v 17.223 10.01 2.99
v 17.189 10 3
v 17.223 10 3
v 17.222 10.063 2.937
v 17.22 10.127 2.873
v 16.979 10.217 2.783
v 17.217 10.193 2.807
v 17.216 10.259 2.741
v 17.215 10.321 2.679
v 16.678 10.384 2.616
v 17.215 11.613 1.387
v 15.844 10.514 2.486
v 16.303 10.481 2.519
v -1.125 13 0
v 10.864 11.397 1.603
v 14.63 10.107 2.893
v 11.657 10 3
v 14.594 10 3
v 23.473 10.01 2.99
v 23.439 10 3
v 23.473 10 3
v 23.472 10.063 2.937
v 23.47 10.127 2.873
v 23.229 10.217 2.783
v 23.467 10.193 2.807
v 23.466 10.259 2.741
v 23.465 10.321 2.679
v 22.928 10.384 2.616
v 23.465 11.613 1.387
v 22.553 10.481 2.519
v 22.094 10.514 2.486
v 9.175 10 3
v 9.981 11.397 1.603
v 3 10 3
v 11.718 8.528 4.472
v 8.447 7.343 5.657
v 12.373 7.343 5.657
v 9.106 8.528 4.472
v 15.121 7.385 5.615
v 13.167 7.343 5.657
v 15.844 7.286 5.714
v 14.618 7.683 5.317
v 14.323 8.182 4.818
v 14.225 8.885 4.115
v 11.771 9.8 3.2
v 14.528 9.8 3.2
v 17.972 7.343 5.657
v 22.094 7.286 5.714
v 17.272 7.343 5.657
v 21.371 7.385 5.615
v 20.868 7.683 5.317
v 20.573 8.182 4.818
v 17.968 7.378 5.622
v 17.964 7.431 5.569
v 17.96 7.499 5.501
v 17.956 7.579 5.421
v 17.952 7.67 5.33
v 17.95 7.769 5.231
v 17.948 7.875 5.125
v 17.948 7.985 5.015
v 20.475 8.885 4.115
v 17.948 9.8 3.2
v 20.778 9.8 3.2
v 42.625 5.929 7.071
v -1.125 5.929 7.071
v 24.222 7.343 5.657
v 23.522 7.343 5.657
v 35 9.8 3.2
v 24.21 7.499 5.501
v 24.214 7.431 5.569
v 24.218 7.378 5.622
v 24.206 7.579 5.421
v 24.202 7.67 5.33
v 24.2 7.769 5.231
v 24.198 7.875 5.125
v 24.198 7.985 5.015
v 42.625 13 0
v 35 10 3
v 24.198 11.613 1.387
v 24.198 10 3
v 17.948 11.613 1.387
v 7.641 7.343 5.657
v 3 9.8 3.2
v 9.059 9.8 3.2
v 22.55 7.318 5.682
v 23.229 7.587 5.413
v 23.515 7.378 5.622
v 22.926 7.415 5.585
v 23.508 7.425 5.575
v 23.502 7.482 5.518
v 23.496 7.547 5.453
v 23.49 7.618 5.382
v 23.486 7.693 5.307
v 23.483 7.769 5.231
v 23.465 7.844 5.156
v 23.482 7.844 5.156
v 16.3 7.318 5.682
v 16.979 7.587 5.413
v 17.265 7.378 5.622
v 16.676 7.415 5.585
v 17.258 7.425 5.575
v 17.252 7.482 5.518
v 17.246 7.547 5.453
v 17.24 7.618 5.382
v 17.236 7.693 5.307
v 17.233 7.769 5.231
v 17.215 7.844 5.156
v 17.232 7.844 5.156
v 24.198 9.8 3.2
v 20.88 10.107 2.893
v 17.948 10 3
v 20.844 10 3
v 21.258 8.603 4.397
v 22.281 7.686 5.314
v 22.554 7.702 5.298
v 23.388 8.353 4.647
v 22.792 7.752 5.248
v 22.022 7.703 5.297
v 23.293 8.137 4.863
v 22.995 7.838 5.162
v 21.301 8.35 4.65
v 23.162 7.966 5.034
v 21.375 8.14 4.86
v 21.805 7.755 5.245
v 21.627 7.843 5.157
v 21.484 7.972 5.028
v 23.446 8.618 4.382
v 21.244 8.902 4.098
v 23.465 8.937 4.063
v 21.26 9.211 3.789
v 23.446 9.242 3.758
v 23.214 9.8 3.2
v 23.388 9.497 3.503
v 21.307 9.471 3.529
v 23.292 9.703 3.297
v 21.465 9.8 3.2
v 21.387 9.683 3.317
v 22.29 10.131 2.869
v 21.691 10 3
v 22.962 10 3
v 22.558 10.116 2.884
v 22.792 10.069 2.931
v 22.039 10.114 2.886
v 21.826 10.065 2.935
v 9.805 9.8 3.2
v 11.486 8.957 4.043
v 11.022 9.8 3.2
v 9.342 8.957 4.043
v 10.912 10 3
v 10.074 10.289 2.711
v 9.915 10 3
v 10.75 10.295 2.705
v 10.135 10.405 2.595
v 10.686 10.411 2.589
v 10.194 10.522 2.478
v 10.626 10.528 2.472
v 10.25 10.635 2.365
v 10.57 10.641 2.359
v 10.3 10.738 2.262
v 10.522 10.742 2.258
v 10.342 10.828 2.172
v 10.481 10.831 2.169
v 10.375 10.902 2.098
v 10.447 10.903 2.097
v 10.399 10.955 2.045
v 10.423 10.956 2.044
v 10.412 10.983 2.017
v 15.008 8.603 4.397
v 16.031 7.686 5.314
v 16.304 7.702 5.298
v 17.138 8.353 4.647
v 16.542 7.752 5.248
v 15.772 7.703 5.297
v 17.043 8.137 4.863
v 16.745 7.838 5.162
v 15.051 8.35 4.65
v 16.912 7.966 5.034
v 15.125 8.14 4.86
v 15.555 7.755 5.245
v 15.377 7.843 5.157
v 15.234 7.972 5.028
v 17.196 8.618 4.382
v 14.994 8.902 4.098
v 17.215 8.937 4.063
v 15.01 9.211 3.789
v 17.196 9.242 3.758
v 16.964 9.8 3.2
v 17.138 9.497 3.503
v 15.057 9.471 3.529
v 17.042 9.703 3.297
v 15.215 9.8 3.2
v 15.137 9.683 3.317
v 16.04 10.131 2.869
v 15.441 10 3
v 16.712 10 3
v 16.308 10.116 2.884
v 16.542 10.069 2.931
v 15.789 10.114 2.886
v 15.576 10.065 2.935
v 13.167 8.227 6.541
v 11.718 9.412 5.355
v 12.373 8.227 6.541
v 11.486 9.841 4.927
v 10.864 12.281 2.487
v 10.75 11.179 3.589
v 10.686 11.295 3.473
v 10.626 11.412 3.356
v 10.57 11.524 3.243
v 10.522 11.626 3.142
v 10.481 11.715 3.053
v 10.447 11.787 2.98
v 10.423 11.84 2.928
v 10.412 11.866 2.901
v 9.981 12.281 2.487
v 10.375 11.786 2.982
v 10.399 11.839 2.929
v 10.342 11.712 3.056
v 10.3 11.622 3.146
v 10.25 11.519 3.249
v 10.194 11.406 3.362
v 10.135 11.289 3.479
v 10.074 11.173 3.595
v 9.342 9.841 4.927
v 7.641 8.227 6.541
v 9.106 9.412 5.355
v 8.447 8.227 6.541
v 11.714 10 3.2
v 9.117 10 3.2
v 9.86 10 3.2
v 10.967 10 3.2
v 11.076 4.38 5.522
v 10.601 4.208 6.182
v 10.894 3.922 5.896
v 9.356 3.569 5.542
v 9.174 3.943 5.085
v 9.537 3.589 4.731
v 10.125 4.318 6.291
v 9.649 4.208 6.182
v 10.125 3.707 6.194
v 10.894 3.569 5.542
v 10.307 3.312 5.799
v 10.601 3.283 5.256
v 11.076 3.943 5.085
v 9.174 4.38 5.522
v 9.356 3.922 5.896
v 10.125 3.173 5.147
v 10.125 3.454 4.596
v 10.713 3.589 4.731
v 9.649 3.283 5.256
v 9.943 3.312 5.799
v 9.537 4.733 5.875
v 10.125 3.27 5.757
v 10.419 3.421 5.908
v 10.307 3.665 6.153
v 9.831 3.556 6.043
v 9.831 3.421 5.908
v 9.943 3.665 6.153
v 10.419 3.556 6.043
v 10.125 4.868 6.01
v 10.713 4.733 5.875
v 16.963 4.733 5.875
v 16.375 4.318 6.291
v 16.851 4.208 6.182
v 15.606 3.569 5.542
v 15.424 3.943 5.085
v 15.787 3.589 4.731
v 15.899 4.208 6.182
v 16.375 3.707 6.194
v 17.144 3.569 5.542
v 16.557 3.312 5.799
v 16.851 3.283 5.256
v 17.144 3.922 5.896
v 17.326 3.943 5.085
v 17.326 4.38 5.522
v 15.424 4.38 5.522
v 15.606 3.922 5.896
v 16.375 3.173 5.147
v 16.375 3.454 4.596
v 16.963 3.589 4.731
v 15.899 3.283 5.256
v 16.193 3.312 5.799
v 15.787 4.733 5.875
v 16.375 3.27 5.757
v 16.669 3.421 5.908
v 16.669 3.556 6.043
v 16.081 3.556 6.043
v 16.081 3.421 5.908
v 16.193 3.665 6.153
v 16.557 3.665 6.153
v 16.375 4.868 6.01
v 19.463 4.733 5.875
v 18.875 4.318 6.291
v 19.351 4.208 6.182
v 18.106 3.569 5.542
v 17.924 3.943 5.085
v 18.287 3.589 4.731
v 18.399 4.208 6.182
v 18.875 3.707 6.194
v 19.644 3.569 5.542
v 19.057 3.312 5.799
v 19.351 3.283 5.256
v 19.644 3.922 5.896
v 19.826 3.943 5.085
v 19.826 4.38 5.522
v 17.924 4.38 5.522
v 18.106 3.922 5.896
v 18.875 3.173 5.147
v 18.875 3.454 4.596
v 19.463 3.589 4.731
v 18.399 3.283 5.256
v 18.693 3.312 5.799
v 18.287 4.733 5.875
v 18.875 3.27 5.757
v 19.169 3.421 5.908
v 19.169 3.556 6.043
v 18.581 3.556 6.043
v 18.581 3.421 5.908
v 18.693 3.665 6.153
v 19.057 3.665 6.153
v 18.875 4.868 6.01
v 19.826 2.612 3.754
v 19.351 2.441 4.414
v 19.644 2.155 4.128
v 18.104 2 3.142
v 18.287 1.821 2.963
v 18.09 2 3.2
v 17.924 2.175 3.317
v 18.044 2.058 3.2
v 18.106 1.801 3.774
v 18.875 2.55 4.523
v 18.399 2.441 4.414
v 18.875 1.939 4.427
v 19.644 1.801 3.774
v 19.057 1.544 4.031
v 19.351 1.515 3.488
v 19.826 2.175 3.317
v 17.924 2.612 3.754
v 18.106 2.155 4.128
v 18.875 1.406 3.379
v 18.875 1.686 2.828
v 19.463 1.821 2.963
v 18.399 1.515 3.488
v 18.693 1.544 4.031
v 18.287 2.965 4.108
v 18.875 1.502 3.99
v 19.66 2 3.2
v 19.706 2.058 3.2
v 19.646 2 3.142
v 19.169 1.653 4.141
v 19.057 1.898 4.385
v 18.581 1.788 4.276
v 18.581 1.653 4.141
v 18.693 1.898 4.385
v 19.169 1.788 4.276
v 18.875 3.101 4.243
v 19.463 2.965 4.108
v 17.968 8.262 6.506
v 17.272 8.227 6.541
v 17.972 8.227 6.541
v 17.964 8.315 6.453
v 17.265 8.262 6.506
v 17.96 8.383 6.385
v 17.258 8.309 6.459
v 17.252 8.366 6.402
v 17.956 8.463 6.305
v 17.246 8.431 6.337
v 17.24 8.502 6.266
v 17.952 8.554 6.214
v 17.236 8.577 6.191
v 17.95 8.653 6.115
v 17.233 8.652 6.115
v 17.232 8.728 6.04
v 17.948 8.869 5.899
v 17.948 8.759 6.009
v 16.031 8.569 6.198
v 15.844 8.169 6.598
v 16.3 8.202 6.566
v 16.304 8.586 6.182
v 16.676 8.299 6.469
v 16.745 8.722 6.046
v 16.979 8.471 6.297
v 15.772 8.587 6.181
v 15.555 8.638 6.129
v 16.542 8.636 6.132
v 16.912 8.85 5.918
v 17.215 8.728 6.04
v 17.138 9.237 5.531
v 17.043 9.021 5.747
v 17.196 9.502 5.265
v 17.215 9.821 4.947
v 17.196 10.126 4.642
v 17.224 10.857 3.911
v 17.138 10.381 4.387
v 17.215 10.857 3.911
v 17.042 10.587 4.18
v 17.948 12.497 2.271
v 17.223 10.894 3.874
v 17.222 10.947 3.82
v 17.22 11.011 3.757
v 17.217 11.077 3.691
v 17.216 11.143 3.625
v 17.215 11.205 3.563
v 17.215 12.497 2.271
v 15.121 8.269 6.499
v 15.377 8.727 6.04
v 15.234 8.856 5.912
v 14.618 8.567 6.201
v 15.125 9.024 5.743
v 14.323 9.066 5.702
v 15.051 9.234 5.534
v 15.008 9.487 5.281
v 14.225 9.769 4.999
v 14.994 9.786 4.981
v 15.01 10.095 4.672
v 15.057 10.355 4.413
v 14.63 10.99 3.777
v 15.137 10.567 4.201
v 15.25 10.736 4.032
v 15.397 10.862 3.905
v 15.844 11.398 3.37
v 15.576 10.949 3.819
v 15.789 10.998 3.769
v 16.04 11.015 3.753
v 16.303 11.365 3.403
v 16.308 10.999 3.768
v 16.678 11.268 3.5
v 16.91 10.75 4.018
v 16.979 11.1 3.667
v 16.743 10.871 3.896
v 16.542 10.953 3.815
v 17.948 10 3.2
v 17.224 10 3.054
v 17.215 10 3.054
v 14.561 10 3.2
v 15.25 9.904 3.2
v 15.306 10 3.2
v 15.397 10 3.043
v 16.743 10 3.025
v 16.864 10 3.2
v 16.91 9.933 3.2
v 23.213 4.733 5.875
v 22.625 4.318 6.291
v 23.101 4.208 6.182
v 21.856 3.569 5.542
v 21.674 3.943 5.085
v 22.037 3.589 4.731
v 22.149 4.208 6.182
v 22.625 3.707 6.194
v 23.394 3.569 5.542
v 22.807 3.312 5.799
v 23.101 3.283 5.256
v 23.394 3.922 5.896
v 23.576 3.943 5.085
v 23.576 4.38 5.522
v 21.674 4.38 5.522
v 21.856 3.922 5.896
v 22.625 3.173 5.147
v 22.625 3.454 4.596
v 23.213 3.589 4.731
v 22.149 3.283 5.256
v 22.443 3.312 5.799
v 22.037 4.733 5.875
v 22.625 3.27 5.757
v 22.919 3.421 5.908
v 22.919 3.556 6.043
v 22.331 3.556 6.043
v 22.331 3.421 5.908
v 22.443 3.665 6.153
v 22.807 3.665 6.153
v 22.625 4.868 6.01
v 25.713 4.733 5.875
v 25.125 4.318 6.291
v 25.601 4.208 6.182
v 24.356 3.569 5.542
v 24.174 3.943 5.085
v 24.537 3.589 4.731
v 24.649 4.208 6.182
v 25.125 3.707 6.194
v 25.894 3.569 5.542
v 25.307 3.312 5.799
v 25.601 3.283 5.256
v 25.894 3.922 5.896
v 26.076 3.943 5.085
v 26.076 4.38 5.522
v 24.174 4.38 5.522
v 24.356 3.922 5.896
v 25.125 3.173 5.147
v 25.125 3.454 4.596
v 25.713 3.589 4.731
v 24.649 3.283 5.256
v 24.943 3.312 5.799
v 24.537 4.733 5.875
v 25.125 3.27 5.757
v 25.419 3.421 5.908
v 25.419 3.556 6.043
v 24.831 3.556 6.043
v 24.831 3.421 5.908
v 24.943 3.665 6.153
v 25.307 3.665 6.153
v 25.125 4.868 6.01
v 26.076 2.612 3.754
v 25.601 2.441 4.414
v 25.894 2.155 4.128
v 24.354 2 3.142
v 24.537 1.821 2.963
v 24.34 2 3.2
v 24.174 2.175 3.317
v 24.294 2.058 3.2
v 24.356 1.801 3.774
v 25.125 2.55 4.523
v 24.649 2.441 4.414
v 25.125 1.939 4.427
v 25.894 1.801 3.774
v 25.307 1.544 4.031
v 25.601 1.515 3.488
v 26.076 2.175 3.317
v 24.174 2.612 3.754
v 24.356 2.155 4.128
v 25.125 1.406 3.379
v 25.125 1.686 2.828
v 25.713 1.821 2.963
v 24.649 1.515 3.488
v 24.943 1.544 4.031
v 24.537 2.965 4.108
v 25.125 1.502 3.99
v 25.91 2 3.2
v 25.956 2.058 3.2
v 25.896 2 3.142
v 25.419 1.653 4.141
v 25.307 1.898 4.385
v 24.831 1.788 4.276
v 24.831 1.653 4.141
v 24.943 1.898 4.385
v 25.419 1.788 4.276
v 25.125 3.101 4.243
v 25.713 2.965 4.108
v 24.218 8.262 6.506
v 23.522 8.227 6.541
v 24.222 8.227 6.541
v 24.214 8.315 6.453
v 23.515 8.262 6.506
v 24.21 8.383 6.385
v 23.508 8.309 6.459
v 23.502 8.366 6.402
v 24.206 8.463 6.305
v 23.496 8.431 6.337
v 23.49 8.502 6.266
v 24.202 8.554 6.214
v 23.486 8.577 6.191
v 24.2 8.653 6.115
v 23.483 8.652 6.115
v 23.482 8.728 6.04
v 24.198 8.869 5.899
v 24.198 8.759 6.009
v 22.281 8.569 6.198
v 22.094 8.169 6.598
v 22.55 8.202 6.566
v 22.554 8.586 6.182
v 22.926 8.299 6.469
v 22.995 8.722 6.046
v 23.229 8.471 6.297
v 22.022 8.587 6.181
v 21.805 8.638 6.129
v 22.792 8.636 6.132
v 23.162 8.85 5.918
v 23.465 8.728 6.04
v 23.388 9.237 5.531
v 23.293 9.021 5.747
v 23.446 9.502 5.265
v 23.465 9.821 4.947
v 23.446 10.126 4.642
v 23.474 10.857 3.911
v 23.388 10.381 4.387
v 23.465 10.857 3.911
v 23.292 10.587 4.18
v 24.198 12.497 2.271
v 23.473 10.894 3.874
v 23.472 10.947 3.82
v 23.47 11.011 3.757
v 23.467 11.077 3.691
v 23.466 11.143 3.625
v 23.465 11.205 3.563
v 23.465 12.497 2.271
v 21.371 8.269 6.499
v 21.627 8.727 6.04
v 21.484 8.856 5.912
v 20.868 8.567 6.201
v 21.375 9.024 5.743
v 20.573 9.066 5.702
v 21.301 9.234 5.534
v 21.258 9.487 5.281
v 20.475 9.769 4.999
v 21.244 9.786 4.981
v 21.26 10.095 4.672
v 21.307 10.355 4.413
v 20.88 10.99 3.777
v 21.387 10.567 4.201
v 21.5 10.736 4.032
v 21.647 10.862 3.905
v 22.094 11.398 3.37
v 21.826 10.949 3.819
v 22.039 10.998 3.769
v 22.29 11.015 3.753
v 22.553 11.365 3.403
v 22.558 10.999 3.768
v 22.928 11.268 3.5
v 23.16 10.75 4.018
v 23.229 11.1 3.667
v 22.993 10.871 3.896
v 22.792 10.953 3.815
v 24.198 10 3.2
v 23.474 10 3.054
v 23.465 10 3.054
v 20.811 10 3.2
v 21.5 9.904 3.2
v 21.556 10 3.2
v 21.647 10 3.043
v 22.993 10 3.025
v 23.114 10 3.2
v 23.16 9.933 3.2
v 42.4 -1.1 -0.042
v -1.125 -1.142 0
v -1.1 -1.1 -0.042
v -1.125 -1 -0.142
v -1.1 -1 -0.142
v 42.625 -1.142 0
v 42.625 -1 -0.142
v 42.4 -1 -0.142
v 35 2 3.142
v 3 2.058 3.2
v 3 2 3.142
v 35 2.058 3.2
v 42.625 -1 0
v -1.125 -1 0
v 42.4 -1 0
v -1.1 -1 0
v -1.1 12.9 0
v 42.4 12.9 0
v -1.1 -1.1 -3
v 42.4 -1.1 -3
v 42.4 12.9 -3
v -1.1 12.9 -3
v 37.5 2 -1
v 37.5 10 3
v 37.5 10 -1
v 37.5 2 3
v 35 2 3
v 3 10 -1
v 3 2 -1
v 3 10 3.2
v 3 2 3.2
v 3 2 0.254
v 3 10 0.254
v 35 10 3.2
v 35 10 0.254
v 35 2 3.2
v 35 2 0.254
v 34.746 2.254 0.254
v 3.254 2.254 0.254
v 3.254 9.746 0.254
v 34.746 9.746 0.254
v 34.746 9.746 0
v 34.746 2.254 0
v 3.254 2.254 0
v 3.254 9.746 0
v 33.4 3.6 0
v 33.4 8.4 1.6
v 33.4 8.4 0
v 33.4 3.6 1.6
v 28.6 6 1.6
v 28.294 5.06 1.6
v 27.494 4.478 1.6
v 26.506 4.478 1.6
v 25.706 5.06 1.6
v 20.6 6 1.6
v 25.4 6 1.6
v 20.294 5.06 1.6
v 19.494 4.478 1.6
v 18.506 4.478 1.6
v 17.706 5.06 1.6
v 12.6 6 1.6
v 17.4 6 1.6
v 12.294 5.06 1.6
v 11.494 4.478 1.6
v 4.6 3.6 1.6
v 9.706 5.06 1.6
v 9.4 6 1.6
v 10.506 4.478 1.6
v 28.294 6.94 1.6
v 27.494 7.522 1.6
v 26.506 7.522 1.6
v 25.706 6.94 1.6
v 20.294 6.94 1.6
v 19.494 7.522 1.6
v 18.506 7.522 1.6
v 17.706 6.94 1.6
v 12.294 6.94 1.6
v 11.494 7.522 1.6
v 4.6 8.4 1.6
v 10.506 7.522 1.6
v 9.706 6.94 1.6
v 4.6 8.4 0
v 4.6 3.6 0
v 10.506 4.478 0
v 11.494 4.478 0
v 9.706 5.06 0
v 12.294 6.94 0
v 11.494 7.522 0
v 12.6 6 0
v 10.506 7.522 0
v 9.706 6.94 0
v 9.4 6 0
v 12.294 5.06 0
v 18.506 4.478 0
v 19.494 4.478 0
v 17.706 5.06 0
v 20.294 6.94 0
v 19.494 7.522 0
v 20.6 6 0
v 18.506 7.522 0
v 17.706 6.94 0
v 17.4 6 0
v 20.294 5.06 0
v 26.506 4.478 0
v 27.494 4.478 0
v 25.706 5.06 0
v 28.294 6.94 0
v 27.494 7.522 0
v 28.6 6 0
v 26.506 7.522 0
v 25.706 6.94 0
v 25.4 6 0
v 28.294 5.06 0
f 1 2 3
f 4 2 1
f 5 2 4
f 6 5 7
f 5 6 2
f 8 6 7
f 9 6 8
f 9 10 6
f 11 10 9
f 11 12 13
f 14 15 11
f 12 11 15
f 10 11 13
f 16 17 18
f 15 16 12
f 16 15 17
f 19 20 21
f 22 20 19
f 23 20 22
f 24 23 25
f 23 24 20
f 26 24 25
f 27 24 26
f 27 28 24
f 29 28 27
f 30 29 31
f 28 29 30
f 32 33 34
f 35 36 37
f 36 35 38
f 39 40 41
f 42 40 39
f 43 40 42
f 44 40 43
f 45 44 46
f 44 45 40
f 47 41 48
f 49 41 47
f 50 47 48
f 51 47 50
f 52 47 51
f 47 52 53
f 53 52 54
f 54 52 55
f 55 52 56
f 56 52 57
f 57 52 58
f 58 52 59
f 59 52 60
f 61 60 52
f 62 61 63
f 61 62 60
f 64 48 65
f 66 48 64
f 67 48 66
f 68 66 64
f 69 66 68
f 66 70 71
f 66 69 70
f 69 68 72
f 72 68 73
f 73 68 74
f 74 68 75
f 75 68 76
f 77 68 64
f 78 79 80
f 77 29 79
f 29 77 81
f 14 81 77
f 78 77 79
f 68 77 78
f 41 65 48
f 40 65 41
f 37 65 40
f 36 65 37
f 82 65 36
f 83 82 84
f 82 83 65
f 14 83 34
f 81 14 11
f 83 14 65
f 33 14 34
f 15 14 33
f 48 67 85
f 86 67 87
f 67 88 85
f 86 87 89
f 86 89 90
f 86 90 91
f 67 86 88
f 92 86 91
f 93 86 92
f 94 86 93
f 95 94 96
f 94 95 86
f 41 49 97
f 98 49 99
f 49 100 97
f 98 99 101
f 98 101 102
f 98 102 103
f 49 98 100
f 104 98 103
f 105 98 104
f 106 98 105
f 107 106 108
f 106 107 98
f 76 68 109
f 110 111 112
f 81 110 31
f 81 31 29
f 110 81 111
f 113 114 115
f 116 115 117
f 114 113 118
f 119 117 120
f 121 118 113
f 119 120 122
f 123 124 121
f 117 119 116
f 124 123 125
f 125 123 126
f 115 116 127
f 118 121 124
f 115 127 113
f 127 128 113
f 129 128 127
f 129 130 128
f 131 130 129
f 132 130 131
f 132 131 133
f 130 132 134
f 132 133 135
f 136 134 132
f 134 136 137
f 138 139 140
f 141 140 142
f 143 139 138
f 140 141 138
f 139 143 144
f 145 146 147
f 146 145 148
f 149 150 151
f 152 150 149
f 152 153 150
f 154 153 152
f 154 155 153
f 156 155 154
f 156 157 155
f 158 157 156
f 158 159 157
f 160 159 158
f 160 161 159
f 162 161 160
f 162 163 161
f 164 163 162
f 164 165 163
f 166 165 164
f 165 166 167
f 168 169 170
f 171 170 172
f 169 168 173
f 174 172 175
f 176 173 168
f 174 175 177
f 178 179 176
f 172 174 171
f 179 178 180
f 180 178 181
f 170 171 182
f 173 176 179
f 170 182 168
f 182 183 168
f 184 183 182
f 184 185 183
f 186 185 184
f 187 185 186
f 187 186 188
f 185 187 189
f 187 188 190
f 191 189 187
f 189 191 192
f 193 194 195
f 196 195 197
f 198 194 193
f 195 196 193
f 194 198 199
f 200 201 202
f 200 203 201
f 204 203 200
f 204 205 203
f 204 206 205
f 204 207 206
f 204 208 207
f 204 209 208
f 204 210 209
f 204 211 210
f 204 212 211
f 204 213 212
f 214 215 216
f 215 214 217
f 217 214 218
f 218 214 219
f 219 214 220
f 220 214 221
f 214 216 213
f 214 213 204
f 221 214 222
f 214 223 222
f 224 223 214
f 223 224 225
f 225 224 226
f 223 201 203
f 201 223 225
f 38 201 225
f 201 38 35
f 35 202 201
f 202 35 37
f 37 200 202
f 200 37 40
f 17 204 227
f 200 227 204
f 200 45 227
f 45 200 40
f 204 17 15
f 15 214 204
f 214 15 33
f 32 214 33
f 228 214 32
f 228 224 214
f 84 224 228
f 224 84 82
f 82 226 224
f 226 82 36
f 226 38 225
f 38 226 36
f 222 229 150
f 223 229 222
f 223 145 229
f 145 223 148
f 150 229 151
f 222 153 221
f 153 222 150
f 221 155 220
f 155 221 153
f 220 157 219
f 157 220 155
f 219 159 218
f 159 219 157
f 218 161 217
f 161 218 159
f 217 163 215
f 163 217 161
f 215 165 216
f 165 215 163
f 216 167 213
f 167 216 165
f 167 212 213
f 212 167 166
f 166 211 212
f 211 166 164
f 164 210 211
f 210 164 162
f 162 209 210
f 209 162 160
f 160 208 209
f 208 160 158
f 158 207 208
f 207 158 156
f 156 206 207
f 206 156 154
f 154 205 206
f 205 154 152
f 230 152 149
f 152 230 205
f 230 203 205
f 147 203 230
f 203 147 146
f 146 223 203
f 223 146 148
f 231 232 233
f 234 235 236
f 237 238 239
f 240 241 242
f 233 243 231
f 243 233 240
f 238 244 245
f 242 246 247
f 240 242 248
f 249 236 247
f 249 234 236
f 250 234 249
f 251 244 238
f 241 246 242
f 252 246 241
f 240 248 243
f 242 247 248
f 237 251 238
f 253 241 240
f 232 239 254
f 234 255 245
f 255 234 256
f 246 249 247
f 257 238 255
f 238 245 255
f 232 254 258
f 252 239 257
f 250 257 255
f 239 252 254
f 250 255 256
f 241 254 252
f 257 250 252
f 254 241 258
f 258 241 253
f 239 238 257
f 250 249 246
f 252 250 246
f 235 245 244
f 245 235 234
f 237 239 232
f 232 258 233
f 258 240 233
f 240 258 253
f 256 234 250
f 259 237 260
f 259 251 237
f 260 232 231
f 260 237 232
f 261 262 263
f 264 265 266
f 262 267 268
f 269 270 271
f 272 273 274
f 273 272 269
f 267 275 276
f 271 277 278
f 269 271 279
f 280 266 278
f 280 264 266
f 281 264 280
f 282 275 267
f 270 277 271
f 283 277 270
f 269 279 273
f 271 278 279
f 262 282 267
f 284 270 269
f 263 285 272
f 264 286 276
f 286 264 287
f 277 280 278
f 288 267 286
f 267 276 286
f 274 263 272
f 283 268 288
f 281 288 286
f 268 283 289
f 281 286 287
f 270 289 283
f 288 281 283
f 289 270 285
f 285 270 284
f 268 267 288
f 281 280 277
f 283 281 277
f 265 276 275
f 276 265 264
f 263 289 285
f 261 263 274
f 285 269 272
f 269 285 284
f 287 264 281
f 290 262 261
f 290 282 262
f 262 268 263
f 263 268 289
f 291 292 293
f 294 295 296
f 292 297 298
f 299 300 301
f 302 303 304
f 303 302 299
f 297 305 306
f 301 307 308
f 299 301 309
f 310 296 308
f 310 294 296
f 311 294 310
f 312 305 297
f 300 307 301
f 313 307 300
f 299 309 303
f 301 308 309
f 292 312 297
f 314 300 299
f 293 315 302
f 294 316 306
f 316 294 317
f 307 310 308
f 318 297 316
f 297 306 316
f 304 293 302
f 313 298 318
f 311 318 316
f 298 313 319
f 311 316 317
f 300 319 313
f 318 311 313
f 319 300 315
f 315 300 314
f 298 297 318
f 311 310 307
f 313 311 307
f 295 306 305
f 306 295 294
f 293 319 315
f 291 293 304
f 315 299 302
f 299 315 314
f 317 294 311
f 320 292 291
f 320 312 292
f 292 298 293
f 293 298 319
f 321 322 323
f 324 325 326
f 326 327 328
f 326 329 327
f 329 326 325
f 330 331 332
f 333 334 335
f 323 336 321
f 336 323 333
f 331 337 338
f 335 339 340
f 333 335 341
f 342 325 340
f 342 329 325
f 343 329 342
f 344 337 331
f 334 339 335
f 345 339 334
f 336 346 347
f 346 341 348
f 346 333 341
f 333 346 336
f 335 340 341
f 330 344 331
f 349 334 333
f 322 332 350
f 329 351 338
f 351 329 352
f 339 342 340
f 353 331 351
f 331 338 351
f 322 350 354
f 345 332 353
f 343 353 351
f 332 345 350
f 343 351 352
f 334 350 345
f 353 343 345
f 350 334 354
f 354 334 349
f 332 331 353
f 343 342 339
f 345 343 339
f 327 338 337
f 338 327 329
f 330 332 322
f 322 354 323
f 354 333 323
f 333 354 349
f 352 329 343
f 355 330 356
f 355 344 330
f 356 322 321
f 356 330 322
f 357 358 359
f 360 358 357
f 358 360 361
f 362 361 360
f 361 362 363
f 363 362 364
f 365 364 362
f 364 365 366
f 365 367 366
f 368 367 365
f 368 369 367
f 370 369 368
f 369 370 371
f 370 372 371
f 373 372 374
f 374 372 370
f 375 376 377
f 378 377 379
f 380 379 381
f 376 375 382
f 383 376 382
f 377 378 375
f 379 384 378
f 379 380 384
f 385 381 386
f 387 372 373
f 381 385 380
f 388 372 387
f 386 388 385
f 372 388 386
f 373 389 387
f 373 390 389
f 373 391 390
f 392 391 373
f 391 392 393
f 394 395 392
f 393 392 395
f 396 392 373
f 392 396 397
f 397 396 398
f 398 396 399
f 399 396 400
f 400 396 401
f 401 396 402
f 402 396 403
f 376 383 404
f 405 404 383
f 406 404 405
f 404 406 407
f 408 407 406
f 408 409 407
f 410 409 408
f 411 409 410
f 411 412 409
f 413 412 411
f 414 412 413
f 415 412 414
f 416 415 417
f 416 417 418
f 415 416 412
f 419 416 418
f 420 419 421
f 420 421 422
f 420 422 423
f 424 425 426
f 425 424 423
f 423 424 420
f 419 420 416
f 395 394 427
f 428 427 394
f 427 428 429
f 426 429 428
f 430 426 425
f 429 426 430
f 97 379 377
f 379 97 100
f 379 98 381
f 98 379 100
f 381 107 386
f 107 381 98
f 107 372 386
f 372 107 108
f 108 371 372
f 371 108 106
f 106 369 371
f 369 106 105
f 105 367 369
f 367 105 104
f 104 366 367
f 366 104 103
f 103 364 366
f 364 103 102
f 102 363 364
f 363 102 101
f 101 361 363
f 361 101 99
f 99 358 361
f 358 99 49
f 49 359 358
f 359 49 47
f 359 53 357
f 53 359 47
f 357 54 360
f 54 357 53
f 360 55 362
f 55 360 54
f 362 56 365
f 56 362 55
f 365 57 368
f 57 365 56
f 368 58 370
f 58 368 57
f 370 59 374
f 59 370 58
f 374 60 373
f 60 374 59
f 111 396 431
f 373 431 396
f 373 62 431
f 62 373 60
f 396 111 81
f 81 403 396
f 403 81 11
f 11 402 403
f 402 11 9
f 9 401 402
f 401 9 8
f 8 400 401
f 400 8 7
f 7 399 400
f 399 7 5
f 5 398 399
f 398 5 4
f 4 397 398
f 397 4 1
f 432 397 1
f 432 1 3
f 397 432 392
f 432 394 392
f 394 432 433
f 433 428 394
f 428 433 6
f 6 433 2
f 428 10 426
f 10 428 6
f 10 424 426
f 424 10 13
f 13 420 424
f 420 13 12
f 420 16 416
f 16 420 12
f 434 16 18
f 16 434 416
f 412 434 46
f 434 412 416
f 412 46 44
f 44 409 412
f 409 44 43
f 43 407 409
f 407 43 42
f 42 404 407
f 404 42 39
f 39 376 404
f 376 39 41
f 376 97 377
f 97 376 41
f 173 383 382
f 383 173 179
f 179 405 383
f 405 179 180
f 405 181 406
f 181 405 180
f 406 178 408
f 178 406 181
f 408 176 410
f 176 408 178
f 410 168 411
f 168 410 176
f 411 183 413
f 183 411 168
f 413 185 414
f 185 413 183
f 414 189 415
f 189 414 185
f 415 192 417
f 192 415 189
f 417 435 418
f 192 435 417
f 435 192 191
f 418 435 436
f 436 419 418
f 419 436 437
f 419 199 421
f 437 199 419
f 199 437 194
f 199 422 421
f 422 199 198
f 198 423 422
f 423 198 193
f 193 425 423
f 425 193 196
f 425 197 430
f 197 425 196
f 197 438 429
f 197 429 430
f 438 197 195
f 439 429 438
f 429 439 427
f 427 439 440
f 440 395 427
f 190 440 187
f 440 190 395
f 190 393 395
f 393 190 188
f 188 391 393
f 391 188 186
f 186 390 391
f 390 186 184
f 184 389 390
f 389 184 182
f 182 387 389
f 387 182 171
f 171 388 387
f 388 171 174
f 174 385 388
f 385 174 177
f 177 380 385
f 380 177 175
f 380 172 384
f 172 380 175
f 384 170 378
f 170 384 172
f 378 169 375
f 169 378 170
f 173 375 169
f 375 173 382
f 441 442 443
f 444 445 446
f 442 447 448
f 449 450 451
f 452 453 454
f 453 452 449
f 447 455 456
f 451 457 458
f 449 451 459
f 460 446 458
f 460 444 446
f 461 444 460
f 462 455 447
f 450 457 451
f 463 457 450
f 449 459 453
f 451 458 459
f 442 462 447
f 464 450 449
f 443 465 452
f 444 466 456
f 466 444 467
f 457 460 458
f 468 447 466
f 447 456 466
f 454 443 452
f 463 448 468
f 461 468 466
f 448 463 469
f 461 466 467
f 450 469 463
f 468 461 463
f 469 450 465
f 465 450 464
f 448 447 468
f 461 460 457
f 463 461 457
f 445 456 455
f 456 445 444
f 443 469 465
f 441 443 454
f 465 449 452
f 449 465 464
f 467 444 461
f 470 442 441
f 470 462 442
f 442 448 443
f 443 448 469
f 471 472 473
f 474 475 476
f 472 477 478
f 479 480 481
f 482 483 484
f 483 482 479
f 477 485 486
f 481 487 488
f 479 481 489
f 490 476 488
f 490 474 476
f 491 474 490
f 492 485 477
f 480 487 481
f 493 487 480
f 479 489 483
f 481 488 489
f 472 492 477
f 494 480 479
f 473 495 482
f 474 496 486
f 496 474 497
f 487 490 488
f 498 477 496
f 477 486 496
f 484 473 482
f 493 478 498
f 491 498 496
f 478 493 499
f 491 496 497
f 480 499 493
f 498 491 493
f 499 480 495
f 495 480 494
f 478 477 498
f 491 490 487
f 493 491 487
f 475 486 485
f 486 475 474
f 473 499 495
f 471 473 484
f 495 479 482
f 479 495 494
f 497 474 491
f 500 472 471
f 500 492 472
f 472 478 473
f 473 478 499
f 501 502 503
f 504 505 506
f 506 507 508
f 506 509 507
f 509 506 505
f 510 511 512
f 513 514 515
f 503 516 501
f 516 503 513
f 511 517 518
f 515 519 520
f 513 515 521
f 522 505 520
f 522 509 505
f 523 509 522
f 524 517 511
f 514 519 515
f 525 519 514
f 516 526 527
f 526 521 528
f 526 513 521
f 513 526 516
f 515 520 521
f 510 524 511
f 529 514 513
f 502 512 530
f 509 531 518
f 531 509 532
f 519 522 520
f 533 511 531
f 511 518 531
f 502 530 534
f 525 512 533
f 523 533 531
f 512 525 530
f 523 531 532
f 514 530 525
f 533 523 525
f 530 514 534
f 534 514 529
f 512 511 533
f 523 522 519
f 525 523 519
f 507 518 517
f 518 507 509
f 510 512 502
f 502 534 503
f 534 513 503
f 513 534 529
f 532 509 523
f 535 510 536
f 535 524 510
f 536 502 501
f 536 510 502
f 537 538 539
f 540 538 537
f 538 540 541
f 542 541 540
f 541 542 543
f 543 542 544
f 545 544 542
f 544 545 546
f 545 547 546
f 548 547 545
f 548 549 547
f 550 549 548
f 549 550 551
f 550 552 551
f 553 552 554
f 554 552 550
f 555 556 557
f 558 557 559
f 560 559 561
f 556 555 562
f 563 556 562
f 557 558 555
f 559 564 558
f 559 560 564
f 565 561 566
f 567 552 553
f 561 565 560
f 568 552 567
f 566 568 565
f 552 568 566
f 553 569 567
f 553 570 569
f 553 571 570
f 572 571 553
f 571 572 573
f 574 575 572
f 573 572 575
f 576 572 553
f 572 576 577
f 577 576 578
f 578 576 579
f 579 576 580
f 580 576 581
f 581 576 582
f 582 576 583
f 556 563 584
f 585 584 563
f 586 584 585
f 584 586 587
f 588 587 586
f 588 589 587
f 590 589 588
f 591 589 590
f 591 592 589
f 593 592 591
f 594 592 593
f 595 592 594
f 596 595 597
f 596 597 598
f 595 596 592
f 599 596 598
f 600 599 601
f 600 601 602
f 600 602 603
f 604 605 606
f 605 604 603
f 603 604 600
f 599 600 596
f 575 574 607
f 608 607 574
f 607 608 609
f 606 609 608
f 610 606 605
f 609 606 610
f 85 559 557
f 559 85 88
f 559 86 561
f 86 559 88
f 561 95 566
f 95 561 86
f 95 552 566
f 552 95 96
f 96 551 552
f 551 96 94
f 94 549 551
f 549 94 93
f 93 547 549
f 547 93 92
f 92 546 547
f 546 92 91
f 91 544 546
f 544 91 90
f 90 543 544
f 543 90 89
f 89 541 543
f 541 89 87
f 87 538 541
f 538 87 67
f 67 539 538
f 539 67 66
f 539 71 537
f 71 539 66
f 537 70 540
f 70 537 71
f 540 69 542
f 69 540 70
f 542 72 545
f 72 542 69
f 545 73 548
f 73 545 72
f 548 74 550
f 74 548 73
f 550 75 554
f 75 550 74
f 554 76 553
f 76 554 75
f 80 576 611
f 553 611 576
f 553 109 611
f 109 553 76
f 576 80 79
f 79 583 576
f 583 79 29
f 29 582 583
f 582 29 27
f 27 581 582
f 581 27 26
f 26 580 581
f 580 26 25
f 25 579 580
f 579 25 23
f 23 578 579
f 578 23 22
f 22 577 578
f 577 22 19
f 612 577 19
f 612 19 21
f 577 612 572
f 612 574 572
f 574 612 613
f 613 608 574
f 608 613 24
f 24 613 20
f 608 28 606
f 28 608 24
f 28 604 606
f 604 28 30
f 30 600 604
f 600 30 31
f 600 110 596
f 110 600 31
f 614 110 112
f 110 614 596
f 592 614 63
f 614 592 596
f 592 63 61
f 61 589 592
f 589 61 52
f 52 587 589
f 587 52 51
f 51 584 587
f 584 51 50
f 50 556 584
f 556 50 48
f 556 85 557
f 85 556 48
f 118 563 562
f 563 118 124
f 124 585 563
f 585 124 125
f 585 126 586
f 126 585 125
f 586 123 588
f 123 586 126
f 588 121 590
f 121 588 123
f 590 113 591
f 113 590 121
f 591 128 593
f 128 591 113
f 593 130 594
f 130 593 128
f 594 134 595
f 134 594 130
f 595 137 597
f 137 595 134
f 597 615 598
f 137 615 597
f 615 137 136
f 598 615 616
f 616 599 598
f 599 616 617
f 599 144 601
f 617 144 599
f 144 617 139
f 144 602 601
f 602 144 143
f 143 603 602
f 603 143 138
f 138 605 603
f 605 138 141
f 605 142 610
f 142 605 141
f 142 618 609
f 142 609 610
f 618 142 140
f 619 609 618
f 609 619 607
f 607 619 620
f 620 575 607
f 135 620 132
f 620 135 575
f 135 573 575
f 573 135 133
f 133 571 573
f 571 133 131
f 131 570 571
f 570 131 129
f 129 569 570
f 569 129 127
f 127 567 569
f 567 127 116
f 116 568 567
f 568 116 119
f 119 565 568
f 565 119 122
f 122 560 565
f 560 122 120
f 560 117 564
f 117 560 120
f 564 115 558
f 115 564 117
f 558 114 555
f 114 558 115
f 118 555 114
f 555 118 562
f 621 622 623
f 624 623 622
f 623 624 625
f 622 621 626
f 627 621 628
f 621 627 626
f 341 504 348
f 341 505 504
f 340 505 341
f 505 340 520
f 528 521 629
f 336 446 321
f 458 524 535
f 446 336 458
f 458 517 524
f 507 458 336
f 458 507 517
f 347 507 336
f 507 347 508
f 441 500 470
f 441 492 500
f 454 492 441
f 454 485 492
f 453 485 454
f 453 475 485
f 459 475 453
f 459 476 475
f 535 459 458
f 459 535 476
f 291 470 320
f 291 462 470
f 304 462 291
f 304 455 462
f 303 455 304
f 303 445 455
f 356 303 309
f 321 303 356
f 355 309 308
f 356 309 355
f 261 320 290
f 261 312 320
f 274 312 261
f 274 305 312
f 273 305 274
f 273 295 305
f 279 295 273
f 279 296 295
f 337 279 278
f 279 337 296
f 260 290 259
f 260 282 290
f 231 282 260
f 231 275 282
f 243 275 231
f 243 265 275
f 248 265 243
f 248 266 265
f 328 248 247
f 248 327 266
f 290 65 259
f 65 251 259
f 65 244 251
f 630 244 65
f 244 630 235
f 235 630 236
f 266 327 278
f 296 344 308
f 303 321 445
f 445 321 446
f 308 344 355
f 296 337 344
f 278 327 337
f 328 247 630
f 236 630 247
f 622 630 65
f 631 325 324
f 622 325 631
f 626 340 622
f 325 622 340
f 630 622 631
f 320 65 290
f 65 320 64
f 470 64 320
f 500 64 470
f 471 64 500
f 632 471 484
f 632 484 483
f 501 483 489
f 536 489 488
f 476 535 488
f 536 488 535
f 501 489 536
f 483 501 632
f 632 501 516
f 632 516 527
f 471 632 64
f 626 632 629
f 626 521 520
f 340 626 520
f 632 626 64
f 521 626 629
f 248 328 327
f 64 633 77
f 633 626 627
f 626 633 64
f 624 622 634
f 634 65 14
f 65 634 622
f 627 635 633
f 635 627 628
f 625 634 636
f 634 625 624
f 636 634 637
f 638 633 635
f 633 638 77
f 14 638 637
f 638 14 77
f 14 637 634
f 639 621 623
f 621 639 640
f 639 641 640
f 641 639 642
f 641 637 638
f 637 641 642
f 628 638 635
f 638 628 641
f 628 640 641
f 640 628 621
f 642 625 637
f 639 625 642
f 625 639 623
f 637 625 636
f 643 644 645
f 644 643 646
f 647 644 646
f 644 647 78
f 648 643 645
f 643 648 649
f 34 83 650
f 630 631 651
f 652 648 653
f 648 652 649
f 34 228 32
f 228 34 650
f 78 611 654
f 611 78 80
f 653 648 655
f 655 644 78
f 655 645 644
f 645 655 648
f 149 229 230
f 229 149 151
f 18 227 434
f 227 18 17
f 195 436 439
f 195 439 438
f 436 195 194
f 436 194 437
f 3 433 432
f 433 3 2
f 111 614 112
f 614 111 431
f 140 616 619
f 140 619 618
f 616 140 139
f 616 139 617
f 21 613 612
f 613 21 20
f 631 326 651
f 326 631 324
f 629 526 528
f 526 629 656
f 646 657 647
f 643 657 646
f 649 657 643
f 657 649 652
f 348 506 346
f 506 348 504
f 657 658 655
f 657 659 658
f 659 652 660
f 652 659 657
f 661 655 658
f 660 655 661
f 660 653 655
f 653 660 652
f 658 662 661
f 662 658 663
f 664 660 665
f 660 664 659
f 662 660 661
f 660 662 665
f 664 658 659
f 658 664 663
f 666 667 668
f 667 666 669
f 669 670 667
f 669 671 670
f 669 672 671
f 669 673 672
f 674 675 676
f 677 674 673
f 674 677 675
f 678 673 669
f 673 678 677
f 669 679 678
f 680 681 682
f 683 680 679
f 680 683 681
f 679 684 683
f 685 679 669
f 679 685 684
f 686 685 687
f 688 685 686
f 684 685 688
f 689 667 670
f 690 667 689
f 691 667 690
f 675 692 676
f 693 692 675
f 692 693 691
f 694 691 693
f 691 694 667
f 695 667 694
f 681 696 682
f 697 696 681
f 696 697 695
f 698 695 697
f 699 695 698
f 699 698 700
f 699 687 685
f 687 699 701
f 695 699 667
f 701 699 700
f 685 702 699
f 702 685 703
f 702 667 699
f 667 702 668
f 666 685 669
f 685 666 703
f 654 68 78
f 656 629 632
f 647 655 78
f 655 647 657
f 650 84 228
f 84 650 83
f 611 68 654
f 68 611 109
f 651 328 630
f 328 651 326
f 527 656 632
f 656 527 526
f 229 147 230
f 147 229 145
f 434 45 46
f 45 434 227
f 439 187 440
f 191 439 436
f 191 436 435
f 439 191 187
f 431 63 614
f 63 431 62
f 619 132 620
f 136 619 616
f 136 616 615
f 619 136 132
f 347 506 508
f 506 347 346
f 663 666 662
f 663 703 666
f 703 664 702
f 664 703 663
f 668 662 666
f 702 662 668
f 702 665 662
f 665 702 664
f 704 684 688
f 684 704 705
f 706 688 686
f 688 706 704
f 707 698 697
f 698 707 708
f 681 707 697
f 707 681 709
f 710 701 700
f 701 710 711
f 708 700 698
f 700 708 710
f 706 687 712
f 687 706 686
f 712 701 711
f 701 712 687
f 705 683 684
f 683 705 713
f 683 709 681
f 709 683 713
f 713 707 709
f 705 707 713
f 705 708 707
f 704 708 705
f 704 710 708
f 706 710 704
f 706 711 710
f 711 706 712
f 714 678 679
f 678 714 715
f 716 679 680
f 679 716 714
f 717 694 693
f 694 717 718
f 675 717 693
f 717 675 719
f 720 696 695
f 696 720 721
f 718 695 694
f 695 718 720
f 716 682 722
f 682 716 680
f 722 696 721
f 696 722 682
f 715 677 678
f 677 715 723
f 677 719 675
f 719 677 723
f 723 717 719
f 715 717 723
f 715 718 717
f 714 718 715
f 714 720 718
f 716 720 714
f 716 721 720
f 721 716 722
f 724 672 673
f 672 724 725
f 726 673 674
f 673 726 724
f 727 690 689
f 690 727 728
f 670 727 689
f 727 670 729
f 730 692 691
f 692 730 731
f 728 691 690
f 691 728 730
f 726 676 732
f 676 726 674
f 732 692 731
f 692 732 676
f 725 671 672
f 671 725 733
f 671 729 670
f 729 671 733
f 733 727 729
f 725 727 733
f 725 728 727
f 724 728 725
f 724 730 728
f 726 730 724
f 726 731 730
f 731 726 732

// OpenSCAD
// file: ../OpenSCAD/brailleAndText.scad
/*
Braille Module
http://creativecommons.org/licenses/by/3.0/
*/


// mm sizes from http://dots.physics.orst.edu/gs_layout.html
radius = 0.25;
spacing = 2.5;
startOffset = 3.75;
distance = startOffset + spacing;

plate_height = 10;
plate_thickness = 10;   // was 2.

$fn = 10;



module letter(bitmap, char) {
//    echo(char);
	row_size = 2;
	col_size = 3;
	bitmap_size = row_size * col_size;
	
	function loc_x(loc) = floor(loc / row_size) * spacing + spacing;
	function loc_y(loc) = loc % row_size * spacing  + (distance-spacing)/2;

    translate([0, loc_y(-1), -2]) {
        rotate([270, 0, 90]) {
            linear_extrude(height = 1.25)
            text(char, 6);
        }
    }
	
    for (loc = [0:bitmap_size - 1]) {
		if (bitmap[loc] != 0) {
			union() {
				translate(v = [loc_x(loc), loc_y(loc), 0]) {
					sphere(radius = radius* bitmap[loc], center = true);
				}
			}
		}
	}
}


module braille_char(char) {
	if (char == "A" || char == "a") {
		letter([
			1,0,
			0,0,
			0,0
		], char);
	} else if (char == "B" || char == "b") {
		letter([
			1,0,
			1,0,
			0,0
		], char);
	} else if (char == "C" || char == "c") {
		letter([
			1,1,
			0,0,
			0,0
		], char);
	} else if (char == "D" || char == "d") {
		letter([
			1,1,
			0,1,
			0,0
		], char);
	} else if (char == "E" || char == "e") {
		letter([
			1,0,
			0,1,
			0,0
		], char);
	} else if (char == "F" || char == "f") {
		letter([
			1,1,
			1,0,
			0,0
		], char);
	} else if (char == "G" || char == "g") {
		letter([
			1,1,
			1,1,
			0,0
		], char);
	} else if (char == "H" || char == "h") {
		letter([
			1,0,
			1,1,
			0,0
		], char);
	} else if (char == "I" || char == "i") {
		letter([
			0,1,
			1,0,
			0,0
		], char);
	} else if (char == "J" || char == "j") {
		letter([
			0,1,
			1,1,
			0,0
		], char);
	} else if (char == "K" || char == "k") {
		letter([
			1,0,
			0,0,
			1,0
		], char);
	} else if (char == "L" || char == "l") {
		letter([
			1,0,
			1,0,
			1,0
		], char);
	} else if (char == "M" || char == "m") {
		letter([
			1,1,
			0,0,
			1,0
		], char);
	} else if (char == "N" || char == "n") {
		letter([
			1,1,
			0,1,
			1,0
		], char);
	} else if (char == "O" || char == "o") {
		letter([
			1,0,
			0,1,
			1,0
		], char);
	} else if (char == "P" || char == "p") {
		letter([
			1,1,
			1,0,
			1,0
		], char);
	} else if (char == "Q" || char == "q") {
		letter([
			1,1,
			1,1,
			1,0
		], char);
	} else if (char == "R" || char == "r") {
		letter([
			1,0,
			1,1,
			1,0
		], char);
	} else if (char == "S" || char == "s") {
		letter([
			0,1,
			1,0,
			1,0
		], char);
	} else if (char == "T" || char == "t") {
		letter([
			0,1,
			1,1,
			1,0
		], char);
	} else if (char == "U" || char == "u") {
		letter([
			1,0,
			0,0,
			1,1
		], char);
	} else if (char == "V" || char == "v") {
		letter([
			1,0,
			1,1,
			1,0
		], char);
	} else if (char == "W" || char == "w") {
		letter([
			0,1,
			1,1,
			0,1
		], char);
	} else if (char == "X" || char == "x") {
		letter([
			1,1,
			0,0,
			1,1
		], char);
	} else if (char == "Y" || char == "y") {
		letter([
			1,1,
			0,1,
			1,1
		], char);
	} else if (char == "Z" || char == "z") {
		letter([
			1,0,
			0,1,
			1,1
		], char);
    } else if (char == " ") {
		letter([
			0,0,
			0,0,
			0,0
		], char);
	} else {
		echo("Invalid Character: ", char);
	}

}

module braille_str(chars) {
    char_count = len(chars);
	echo(str("Total Width of ", chars, " : ",  distance * char_count, "mm"));
	union() {
		for (count = [0:char_count-1]) {
			translate(v = [0, count * distance, plate_thickness]) {
				braille_char(chars[count]);
			}
		}
		translate(v = [0, -distance/2, 0]) {
			color([0,0,1]) {
				cube(size = [plate_height, distance * (char_count+1), plate_thickness]);
			}
            }                                                      
	}
}

function lenText(txt="Hi") = distance * len(txt);

module printTextAndBraille(textToPrint) {
    blockLen = lenText(textToPrint);
    union()
    {
        difference() {                      // remove second box from first
            rotate([0,45,0]) {              // make it on its edge
                braille_str((textToPrint)); // make a long box
            }
            translate([0, -3.25, -8]) {     // move in right place
                cube(size = [14, (blockLen+8), 8]);
            }
        } 
        translate([0.1, -3.1, -3]) {     // move in right place
            cube(size = [14, (blockLen+6), 3]); 
        }
    }                                 
}

printTextAndBraille("HELLO CalLUM");
// file: ../openSCADLibs/lego_brick_builder.scad
/*

 Basic Lego brick builder module for OpenScad by Jorg Janssen 2013 (CC BY-NC 3.0) 
 To use this in your own projects add:

 use <path_to_this_file/lego_brick_builder.scad>
 brick (length, width, height [,smooth]);

 Length and width are in standard lego brick dimensions. 
 Height is in flat brick heights, so for a normal lego brick height = 3.
 Add optional smooth = true for a brick without studs. 
 Use height = 0 to just put studs/knobs on top of other things.

 */
$fn = 150;

// and this is how it's done:

FLU = 1.6; // Fundamental Lego Unit = 1.6 mm

BRICK_WIDTH = 5*FLU; // basic brick width
BRICK_HEIGHT = 6*FLU; // basic brick height
PLATE_HEIGHT = 2*FLU; // basic plate height
WALL_THICKNESS = FLU; // outer wall of the brick
STUD_RADIUS = 1.5*FLU; // studs are the small cylinders on top of the brick with the lego logo ('nopje' in Dutch)
STUD_HEIGHT = FLU; 
ANTI_STUD_RADIUS = 0.5*4.07*FLU;  // an anti stud is the hollow cylinder inside bricks that have length > 1 and width > 1
PIN_RADIUS = FLU; // a pin is the small cylinder inside bricks that have length = 1 or width = 1
SUPPORT_THICKNESS = 0.254; // support is the thin surface between anti studs, pins and walls, your printer might not print this thin, try thicker!
EDGE = 0.254; // this is the width and height of the bottom line edge of smooth bricks
CORRECTION = 0.1; // addition to each size, to make sure all parts connect by moving them a little inside each other

module brick(length = 4, width = 2, height = 3, smooth = false){

	// brick shell
	difference(){
		cube(size = [length*BRICK_WIDTH,width*BRICK_WIDTH,height*PLATE_HEIGHT]);
		translate([WALL_THICKNESS,WALL_THICKNESS,-WALL_THICKNESS])
		union(){
			cube(size = [length*BRICK_WIDTH-2*WALL_THICKNESS,width*BRICK_WIDTH-2*WALL_THICKNESS,height*PLATE_HEIGHT]);
			// stud inner holes, radius = pin radius
			if (!smooth) {
				translate([STUD_RADIUS+WALL_THICKNESS,STUD_RADIUS+WALL_THICKNESS,height*PLATE_HEIGHT])
				for (y = [0:width-1]){
					for (x = [0:length-1]){
						translate ([x*BRICK_WIDTH-WALL_THICKNESS,y*BRICK_WIDTH-WALL_THICKNESS,-CORRECTION])
						cylinder(h=WALL_THICKNESS+2*CORRECTION,r=PIN_RADIUS);
					}
				}
			}
			// small bottom line edge for smooth bricks
			else {
				translate([-WALL_THICKNESS-CORRECTION,-WALL_THICKNESS-CORRECTION,FLU-CORRECTION]) 
				difference() {
					cube([length*BRICK_WIDTH+2*CORRECTION,width*BRICK_WIDTH+2*CORRECTION,EDGE+CORRECTION]);
					translate([EDGE+CORRECTION,EDGE+CORRECTION,-CORRECTION])
					cube([length*BRICK_WIDTH-2*EDGE,width*BRICK_WIDTH-2*EDGE,EDGE+3*CORRECTION]); 
				}
			}
		}
	}
	// Studs
	if(!smooth){
		translate([STUD_RADIUS+WALL_THICKNESS,STUD_RADIUS+WALL_THICKNESS,height*PLATE_HEIGHT])
		for (y = [0:width-1]){
			for (x = [0:length-1]){
				translate ([x*BRICK_WIDTH,y*BRICK_WIDTH,-CORRECTION])
				difference(){
					cylinder(h=STUD_HEIGHT+CORRECTION, r=STUD_RADIUS);
					// Stud inner holes
					translate([0,0,-CORRECTION])
					cylinder(h=0.5*STUD_HEIGHT+CORRECTION,r=PIN_RADIUS);
				}
				// tech logo - disable this if your printer isn't capable of printing this small
				if ( length > width){
					translate([x*BRICK_WIDTH+0.8,y*BRICK_WIDTH-1.9,STUD_HEIGHT-CORRECTION])
					resize([1.2*1.7,2.2*1.7,0.254+CORRECTION])
					rotate(a=[0,0,90])
					import("tech.stl");
				}
				else {
					translate([x*BRICK_WIDTH-1.9,y*BRICK_WIDTH-0.8,STUD_HEIGHT-CORRECTION])
					resize([2.2*1.7,1.2*1.7,0.254+CORRECTION])
					import("tech.stl");				
				}				
				/* 
				// Alternative 2-square logo
				translate ([x*BRICK_WIDTH+CORRECTION,y*BRICK_WIDTH-CORRECTION,STUD_HEIGHT-CORRECTION])		
				cube([1,1,2*CORRECTION]);
				translate ([x*BRICK_WIDTH-0.9,y*BRICK_WIDTH-0.9,STUD_HEIGHT-CORRECTION])		
				cube([1,1,0.3]);
				*/				
			}
		}
	}
	// Pins x
	if (width == 1 && length > 1) {	
			for (x = [1:length-1]){
				translate([x*BRICK_WIDTH,0.5*BRICK_WIDTH,0])
				cylinder(h=height*PLATE_HEIGHT-WALL_THICKNESS+CORRECTION,r=PIN_RADIUS);
				// Supports
				if (height > 1) {
				translate([x*BRICK_WIDTH-0.5*SUPPORT_THICKNESS,CORRECTION,STUD_HEIGHT])
				cube(size=[SUPPORT_THICKNESS,BRICK_WIDTH-2*CORRECTION,height*PLATE_HEIGHT-STUD_HEIGHT-WALL_THICKNESS+CORRECTION]);
			}
		}
	}
	// Pins y
	if (length == 1 && width > 1) {	
			for (y = [1:width-1]){
			translate([0.5*BRICK_WIDTH,y*BRICK_WIDTH,0])
			cylinder(h=height*PLATE_HEIGHT-WALL_THICKNESS+CORRECTION,r=PIN_RADIUS);
			// Supports
			if (height > 1) {
			translate([CORRECTION,y*BRICK_WIDTH-0.5*SUPPORT_THICKNESS,STUD_HEIGHT])
			cube(size=[BRICK_WIDTH-2*CORRECTION,SUPPORT_THICKNESS,height*PLATE_HEIGHT-STUD_HEIGHT-WALL_THICKNESS+CORRECTION]);}
			
		}
	}
	// Anti Studs
	if (width > 1 && length > 1){
		difference(){
			union(){
				for(y = [1:width-1]){
					for(x = [1:length-1]){
						// anti studs
						translate([x*BRICK_WIDTH,y*BRICK_WIDTH,0])
						cylinder (h=height*PLATE_HEIGHT-WALL_THICKNESS+CORRECTION, r = ANTI_STUD_RADIUS);
						// Supports
						if (height > 1){
							// Support x
							if (x%2 == 0 && (length%2 == 0 || length%4 == 1 && x<length/2 || length%4 == 3 && x>length/2) || x%2 == 1 && (length%4 == 3 && x<length/2 || length%4 == 1 && x>length/2)) {
								translate([BRICK_WIDTH*x-0.5*SUPPORT_THICKNESS,y*BRICK_WIDTH-BRICK_WIDTH+WALL_THICKNESS-CORRECTION,STUD_HEIGHT])
								cube(size=[SUPPORT_THICKNESS,2*BRICK_WIDTH-2*WALL_THICKNESS,height*PLATE_HEIGHT-STUD_HEIGHT-WALL_THICKNESS+CORRECTION]);
							}
							// Supports y							
							if (y%2 == 0 && (width%2 == 0 || width%4 == 1 && y<width/2 || width%4 == 3 && y>width/2) || y%2 == 1 && (width%4 == 3 && y<width/2 || width%4 == 1 && y>width/2)) {
								translate([x*BRICK_WIDTH-BRICK_WIDTH+WALL_THICKNESS-CORRECTION,BRICK_WIDTH*y-0.5*SUPPORT_THICKNESS,STUD_HEIGHT])
								cube(size=[2*BRICK_WIDTH-2*WALL_THICKNESS,SUPPORT_THICKNESS,height*PLATE_HEIGHT-STUD_HEIGHT-WALL_THICKNESS+CORRECTION]);
							}
						}
					}
				}
			}
			union(){
				for(y = [1:width-1]){
					for(x = [1:length-1]){
						// hollow anti studs
						translate([x*BRICK_WIDTH,y*BRICK_WIDTH,-WALL_THICKNESS])
						cylinder (h=height*PLATE_HEIGHT, r = STUD_RADIUS);				
					}
				}
			}
		}		
	}
}
	
// file: ../OpenSCAD/TextAndBrailleLegoBlock.scad
 include <../openSCADLibs/lego_brick_builder.scad>
 include <../OpenSCAD/brailleAndText.scad>;

module brickAndText(text) {
    txtLen = distance * len(text);
    echo(distance);
    difference() {
        rotate([180,180,90])
            translate([-13, 2, 0])
                printTextAndBraille(text);
        translate([3, 2, -1]) 
            cube([txtLen - 3, BRICK_WIDTH, 4]);
    }
    translate([3,2,0])
        brick(floor(txtLen / BRICK_WIDTH),1,1, true);    
}

// use <../BPNodesV2/TextNBraille.scad>
//brickAndText("This is a test string");  
// main file
use <../OpenSCAD/TextAndBrailleLegoBlock.scad>

brickAndText(" Add  ");
